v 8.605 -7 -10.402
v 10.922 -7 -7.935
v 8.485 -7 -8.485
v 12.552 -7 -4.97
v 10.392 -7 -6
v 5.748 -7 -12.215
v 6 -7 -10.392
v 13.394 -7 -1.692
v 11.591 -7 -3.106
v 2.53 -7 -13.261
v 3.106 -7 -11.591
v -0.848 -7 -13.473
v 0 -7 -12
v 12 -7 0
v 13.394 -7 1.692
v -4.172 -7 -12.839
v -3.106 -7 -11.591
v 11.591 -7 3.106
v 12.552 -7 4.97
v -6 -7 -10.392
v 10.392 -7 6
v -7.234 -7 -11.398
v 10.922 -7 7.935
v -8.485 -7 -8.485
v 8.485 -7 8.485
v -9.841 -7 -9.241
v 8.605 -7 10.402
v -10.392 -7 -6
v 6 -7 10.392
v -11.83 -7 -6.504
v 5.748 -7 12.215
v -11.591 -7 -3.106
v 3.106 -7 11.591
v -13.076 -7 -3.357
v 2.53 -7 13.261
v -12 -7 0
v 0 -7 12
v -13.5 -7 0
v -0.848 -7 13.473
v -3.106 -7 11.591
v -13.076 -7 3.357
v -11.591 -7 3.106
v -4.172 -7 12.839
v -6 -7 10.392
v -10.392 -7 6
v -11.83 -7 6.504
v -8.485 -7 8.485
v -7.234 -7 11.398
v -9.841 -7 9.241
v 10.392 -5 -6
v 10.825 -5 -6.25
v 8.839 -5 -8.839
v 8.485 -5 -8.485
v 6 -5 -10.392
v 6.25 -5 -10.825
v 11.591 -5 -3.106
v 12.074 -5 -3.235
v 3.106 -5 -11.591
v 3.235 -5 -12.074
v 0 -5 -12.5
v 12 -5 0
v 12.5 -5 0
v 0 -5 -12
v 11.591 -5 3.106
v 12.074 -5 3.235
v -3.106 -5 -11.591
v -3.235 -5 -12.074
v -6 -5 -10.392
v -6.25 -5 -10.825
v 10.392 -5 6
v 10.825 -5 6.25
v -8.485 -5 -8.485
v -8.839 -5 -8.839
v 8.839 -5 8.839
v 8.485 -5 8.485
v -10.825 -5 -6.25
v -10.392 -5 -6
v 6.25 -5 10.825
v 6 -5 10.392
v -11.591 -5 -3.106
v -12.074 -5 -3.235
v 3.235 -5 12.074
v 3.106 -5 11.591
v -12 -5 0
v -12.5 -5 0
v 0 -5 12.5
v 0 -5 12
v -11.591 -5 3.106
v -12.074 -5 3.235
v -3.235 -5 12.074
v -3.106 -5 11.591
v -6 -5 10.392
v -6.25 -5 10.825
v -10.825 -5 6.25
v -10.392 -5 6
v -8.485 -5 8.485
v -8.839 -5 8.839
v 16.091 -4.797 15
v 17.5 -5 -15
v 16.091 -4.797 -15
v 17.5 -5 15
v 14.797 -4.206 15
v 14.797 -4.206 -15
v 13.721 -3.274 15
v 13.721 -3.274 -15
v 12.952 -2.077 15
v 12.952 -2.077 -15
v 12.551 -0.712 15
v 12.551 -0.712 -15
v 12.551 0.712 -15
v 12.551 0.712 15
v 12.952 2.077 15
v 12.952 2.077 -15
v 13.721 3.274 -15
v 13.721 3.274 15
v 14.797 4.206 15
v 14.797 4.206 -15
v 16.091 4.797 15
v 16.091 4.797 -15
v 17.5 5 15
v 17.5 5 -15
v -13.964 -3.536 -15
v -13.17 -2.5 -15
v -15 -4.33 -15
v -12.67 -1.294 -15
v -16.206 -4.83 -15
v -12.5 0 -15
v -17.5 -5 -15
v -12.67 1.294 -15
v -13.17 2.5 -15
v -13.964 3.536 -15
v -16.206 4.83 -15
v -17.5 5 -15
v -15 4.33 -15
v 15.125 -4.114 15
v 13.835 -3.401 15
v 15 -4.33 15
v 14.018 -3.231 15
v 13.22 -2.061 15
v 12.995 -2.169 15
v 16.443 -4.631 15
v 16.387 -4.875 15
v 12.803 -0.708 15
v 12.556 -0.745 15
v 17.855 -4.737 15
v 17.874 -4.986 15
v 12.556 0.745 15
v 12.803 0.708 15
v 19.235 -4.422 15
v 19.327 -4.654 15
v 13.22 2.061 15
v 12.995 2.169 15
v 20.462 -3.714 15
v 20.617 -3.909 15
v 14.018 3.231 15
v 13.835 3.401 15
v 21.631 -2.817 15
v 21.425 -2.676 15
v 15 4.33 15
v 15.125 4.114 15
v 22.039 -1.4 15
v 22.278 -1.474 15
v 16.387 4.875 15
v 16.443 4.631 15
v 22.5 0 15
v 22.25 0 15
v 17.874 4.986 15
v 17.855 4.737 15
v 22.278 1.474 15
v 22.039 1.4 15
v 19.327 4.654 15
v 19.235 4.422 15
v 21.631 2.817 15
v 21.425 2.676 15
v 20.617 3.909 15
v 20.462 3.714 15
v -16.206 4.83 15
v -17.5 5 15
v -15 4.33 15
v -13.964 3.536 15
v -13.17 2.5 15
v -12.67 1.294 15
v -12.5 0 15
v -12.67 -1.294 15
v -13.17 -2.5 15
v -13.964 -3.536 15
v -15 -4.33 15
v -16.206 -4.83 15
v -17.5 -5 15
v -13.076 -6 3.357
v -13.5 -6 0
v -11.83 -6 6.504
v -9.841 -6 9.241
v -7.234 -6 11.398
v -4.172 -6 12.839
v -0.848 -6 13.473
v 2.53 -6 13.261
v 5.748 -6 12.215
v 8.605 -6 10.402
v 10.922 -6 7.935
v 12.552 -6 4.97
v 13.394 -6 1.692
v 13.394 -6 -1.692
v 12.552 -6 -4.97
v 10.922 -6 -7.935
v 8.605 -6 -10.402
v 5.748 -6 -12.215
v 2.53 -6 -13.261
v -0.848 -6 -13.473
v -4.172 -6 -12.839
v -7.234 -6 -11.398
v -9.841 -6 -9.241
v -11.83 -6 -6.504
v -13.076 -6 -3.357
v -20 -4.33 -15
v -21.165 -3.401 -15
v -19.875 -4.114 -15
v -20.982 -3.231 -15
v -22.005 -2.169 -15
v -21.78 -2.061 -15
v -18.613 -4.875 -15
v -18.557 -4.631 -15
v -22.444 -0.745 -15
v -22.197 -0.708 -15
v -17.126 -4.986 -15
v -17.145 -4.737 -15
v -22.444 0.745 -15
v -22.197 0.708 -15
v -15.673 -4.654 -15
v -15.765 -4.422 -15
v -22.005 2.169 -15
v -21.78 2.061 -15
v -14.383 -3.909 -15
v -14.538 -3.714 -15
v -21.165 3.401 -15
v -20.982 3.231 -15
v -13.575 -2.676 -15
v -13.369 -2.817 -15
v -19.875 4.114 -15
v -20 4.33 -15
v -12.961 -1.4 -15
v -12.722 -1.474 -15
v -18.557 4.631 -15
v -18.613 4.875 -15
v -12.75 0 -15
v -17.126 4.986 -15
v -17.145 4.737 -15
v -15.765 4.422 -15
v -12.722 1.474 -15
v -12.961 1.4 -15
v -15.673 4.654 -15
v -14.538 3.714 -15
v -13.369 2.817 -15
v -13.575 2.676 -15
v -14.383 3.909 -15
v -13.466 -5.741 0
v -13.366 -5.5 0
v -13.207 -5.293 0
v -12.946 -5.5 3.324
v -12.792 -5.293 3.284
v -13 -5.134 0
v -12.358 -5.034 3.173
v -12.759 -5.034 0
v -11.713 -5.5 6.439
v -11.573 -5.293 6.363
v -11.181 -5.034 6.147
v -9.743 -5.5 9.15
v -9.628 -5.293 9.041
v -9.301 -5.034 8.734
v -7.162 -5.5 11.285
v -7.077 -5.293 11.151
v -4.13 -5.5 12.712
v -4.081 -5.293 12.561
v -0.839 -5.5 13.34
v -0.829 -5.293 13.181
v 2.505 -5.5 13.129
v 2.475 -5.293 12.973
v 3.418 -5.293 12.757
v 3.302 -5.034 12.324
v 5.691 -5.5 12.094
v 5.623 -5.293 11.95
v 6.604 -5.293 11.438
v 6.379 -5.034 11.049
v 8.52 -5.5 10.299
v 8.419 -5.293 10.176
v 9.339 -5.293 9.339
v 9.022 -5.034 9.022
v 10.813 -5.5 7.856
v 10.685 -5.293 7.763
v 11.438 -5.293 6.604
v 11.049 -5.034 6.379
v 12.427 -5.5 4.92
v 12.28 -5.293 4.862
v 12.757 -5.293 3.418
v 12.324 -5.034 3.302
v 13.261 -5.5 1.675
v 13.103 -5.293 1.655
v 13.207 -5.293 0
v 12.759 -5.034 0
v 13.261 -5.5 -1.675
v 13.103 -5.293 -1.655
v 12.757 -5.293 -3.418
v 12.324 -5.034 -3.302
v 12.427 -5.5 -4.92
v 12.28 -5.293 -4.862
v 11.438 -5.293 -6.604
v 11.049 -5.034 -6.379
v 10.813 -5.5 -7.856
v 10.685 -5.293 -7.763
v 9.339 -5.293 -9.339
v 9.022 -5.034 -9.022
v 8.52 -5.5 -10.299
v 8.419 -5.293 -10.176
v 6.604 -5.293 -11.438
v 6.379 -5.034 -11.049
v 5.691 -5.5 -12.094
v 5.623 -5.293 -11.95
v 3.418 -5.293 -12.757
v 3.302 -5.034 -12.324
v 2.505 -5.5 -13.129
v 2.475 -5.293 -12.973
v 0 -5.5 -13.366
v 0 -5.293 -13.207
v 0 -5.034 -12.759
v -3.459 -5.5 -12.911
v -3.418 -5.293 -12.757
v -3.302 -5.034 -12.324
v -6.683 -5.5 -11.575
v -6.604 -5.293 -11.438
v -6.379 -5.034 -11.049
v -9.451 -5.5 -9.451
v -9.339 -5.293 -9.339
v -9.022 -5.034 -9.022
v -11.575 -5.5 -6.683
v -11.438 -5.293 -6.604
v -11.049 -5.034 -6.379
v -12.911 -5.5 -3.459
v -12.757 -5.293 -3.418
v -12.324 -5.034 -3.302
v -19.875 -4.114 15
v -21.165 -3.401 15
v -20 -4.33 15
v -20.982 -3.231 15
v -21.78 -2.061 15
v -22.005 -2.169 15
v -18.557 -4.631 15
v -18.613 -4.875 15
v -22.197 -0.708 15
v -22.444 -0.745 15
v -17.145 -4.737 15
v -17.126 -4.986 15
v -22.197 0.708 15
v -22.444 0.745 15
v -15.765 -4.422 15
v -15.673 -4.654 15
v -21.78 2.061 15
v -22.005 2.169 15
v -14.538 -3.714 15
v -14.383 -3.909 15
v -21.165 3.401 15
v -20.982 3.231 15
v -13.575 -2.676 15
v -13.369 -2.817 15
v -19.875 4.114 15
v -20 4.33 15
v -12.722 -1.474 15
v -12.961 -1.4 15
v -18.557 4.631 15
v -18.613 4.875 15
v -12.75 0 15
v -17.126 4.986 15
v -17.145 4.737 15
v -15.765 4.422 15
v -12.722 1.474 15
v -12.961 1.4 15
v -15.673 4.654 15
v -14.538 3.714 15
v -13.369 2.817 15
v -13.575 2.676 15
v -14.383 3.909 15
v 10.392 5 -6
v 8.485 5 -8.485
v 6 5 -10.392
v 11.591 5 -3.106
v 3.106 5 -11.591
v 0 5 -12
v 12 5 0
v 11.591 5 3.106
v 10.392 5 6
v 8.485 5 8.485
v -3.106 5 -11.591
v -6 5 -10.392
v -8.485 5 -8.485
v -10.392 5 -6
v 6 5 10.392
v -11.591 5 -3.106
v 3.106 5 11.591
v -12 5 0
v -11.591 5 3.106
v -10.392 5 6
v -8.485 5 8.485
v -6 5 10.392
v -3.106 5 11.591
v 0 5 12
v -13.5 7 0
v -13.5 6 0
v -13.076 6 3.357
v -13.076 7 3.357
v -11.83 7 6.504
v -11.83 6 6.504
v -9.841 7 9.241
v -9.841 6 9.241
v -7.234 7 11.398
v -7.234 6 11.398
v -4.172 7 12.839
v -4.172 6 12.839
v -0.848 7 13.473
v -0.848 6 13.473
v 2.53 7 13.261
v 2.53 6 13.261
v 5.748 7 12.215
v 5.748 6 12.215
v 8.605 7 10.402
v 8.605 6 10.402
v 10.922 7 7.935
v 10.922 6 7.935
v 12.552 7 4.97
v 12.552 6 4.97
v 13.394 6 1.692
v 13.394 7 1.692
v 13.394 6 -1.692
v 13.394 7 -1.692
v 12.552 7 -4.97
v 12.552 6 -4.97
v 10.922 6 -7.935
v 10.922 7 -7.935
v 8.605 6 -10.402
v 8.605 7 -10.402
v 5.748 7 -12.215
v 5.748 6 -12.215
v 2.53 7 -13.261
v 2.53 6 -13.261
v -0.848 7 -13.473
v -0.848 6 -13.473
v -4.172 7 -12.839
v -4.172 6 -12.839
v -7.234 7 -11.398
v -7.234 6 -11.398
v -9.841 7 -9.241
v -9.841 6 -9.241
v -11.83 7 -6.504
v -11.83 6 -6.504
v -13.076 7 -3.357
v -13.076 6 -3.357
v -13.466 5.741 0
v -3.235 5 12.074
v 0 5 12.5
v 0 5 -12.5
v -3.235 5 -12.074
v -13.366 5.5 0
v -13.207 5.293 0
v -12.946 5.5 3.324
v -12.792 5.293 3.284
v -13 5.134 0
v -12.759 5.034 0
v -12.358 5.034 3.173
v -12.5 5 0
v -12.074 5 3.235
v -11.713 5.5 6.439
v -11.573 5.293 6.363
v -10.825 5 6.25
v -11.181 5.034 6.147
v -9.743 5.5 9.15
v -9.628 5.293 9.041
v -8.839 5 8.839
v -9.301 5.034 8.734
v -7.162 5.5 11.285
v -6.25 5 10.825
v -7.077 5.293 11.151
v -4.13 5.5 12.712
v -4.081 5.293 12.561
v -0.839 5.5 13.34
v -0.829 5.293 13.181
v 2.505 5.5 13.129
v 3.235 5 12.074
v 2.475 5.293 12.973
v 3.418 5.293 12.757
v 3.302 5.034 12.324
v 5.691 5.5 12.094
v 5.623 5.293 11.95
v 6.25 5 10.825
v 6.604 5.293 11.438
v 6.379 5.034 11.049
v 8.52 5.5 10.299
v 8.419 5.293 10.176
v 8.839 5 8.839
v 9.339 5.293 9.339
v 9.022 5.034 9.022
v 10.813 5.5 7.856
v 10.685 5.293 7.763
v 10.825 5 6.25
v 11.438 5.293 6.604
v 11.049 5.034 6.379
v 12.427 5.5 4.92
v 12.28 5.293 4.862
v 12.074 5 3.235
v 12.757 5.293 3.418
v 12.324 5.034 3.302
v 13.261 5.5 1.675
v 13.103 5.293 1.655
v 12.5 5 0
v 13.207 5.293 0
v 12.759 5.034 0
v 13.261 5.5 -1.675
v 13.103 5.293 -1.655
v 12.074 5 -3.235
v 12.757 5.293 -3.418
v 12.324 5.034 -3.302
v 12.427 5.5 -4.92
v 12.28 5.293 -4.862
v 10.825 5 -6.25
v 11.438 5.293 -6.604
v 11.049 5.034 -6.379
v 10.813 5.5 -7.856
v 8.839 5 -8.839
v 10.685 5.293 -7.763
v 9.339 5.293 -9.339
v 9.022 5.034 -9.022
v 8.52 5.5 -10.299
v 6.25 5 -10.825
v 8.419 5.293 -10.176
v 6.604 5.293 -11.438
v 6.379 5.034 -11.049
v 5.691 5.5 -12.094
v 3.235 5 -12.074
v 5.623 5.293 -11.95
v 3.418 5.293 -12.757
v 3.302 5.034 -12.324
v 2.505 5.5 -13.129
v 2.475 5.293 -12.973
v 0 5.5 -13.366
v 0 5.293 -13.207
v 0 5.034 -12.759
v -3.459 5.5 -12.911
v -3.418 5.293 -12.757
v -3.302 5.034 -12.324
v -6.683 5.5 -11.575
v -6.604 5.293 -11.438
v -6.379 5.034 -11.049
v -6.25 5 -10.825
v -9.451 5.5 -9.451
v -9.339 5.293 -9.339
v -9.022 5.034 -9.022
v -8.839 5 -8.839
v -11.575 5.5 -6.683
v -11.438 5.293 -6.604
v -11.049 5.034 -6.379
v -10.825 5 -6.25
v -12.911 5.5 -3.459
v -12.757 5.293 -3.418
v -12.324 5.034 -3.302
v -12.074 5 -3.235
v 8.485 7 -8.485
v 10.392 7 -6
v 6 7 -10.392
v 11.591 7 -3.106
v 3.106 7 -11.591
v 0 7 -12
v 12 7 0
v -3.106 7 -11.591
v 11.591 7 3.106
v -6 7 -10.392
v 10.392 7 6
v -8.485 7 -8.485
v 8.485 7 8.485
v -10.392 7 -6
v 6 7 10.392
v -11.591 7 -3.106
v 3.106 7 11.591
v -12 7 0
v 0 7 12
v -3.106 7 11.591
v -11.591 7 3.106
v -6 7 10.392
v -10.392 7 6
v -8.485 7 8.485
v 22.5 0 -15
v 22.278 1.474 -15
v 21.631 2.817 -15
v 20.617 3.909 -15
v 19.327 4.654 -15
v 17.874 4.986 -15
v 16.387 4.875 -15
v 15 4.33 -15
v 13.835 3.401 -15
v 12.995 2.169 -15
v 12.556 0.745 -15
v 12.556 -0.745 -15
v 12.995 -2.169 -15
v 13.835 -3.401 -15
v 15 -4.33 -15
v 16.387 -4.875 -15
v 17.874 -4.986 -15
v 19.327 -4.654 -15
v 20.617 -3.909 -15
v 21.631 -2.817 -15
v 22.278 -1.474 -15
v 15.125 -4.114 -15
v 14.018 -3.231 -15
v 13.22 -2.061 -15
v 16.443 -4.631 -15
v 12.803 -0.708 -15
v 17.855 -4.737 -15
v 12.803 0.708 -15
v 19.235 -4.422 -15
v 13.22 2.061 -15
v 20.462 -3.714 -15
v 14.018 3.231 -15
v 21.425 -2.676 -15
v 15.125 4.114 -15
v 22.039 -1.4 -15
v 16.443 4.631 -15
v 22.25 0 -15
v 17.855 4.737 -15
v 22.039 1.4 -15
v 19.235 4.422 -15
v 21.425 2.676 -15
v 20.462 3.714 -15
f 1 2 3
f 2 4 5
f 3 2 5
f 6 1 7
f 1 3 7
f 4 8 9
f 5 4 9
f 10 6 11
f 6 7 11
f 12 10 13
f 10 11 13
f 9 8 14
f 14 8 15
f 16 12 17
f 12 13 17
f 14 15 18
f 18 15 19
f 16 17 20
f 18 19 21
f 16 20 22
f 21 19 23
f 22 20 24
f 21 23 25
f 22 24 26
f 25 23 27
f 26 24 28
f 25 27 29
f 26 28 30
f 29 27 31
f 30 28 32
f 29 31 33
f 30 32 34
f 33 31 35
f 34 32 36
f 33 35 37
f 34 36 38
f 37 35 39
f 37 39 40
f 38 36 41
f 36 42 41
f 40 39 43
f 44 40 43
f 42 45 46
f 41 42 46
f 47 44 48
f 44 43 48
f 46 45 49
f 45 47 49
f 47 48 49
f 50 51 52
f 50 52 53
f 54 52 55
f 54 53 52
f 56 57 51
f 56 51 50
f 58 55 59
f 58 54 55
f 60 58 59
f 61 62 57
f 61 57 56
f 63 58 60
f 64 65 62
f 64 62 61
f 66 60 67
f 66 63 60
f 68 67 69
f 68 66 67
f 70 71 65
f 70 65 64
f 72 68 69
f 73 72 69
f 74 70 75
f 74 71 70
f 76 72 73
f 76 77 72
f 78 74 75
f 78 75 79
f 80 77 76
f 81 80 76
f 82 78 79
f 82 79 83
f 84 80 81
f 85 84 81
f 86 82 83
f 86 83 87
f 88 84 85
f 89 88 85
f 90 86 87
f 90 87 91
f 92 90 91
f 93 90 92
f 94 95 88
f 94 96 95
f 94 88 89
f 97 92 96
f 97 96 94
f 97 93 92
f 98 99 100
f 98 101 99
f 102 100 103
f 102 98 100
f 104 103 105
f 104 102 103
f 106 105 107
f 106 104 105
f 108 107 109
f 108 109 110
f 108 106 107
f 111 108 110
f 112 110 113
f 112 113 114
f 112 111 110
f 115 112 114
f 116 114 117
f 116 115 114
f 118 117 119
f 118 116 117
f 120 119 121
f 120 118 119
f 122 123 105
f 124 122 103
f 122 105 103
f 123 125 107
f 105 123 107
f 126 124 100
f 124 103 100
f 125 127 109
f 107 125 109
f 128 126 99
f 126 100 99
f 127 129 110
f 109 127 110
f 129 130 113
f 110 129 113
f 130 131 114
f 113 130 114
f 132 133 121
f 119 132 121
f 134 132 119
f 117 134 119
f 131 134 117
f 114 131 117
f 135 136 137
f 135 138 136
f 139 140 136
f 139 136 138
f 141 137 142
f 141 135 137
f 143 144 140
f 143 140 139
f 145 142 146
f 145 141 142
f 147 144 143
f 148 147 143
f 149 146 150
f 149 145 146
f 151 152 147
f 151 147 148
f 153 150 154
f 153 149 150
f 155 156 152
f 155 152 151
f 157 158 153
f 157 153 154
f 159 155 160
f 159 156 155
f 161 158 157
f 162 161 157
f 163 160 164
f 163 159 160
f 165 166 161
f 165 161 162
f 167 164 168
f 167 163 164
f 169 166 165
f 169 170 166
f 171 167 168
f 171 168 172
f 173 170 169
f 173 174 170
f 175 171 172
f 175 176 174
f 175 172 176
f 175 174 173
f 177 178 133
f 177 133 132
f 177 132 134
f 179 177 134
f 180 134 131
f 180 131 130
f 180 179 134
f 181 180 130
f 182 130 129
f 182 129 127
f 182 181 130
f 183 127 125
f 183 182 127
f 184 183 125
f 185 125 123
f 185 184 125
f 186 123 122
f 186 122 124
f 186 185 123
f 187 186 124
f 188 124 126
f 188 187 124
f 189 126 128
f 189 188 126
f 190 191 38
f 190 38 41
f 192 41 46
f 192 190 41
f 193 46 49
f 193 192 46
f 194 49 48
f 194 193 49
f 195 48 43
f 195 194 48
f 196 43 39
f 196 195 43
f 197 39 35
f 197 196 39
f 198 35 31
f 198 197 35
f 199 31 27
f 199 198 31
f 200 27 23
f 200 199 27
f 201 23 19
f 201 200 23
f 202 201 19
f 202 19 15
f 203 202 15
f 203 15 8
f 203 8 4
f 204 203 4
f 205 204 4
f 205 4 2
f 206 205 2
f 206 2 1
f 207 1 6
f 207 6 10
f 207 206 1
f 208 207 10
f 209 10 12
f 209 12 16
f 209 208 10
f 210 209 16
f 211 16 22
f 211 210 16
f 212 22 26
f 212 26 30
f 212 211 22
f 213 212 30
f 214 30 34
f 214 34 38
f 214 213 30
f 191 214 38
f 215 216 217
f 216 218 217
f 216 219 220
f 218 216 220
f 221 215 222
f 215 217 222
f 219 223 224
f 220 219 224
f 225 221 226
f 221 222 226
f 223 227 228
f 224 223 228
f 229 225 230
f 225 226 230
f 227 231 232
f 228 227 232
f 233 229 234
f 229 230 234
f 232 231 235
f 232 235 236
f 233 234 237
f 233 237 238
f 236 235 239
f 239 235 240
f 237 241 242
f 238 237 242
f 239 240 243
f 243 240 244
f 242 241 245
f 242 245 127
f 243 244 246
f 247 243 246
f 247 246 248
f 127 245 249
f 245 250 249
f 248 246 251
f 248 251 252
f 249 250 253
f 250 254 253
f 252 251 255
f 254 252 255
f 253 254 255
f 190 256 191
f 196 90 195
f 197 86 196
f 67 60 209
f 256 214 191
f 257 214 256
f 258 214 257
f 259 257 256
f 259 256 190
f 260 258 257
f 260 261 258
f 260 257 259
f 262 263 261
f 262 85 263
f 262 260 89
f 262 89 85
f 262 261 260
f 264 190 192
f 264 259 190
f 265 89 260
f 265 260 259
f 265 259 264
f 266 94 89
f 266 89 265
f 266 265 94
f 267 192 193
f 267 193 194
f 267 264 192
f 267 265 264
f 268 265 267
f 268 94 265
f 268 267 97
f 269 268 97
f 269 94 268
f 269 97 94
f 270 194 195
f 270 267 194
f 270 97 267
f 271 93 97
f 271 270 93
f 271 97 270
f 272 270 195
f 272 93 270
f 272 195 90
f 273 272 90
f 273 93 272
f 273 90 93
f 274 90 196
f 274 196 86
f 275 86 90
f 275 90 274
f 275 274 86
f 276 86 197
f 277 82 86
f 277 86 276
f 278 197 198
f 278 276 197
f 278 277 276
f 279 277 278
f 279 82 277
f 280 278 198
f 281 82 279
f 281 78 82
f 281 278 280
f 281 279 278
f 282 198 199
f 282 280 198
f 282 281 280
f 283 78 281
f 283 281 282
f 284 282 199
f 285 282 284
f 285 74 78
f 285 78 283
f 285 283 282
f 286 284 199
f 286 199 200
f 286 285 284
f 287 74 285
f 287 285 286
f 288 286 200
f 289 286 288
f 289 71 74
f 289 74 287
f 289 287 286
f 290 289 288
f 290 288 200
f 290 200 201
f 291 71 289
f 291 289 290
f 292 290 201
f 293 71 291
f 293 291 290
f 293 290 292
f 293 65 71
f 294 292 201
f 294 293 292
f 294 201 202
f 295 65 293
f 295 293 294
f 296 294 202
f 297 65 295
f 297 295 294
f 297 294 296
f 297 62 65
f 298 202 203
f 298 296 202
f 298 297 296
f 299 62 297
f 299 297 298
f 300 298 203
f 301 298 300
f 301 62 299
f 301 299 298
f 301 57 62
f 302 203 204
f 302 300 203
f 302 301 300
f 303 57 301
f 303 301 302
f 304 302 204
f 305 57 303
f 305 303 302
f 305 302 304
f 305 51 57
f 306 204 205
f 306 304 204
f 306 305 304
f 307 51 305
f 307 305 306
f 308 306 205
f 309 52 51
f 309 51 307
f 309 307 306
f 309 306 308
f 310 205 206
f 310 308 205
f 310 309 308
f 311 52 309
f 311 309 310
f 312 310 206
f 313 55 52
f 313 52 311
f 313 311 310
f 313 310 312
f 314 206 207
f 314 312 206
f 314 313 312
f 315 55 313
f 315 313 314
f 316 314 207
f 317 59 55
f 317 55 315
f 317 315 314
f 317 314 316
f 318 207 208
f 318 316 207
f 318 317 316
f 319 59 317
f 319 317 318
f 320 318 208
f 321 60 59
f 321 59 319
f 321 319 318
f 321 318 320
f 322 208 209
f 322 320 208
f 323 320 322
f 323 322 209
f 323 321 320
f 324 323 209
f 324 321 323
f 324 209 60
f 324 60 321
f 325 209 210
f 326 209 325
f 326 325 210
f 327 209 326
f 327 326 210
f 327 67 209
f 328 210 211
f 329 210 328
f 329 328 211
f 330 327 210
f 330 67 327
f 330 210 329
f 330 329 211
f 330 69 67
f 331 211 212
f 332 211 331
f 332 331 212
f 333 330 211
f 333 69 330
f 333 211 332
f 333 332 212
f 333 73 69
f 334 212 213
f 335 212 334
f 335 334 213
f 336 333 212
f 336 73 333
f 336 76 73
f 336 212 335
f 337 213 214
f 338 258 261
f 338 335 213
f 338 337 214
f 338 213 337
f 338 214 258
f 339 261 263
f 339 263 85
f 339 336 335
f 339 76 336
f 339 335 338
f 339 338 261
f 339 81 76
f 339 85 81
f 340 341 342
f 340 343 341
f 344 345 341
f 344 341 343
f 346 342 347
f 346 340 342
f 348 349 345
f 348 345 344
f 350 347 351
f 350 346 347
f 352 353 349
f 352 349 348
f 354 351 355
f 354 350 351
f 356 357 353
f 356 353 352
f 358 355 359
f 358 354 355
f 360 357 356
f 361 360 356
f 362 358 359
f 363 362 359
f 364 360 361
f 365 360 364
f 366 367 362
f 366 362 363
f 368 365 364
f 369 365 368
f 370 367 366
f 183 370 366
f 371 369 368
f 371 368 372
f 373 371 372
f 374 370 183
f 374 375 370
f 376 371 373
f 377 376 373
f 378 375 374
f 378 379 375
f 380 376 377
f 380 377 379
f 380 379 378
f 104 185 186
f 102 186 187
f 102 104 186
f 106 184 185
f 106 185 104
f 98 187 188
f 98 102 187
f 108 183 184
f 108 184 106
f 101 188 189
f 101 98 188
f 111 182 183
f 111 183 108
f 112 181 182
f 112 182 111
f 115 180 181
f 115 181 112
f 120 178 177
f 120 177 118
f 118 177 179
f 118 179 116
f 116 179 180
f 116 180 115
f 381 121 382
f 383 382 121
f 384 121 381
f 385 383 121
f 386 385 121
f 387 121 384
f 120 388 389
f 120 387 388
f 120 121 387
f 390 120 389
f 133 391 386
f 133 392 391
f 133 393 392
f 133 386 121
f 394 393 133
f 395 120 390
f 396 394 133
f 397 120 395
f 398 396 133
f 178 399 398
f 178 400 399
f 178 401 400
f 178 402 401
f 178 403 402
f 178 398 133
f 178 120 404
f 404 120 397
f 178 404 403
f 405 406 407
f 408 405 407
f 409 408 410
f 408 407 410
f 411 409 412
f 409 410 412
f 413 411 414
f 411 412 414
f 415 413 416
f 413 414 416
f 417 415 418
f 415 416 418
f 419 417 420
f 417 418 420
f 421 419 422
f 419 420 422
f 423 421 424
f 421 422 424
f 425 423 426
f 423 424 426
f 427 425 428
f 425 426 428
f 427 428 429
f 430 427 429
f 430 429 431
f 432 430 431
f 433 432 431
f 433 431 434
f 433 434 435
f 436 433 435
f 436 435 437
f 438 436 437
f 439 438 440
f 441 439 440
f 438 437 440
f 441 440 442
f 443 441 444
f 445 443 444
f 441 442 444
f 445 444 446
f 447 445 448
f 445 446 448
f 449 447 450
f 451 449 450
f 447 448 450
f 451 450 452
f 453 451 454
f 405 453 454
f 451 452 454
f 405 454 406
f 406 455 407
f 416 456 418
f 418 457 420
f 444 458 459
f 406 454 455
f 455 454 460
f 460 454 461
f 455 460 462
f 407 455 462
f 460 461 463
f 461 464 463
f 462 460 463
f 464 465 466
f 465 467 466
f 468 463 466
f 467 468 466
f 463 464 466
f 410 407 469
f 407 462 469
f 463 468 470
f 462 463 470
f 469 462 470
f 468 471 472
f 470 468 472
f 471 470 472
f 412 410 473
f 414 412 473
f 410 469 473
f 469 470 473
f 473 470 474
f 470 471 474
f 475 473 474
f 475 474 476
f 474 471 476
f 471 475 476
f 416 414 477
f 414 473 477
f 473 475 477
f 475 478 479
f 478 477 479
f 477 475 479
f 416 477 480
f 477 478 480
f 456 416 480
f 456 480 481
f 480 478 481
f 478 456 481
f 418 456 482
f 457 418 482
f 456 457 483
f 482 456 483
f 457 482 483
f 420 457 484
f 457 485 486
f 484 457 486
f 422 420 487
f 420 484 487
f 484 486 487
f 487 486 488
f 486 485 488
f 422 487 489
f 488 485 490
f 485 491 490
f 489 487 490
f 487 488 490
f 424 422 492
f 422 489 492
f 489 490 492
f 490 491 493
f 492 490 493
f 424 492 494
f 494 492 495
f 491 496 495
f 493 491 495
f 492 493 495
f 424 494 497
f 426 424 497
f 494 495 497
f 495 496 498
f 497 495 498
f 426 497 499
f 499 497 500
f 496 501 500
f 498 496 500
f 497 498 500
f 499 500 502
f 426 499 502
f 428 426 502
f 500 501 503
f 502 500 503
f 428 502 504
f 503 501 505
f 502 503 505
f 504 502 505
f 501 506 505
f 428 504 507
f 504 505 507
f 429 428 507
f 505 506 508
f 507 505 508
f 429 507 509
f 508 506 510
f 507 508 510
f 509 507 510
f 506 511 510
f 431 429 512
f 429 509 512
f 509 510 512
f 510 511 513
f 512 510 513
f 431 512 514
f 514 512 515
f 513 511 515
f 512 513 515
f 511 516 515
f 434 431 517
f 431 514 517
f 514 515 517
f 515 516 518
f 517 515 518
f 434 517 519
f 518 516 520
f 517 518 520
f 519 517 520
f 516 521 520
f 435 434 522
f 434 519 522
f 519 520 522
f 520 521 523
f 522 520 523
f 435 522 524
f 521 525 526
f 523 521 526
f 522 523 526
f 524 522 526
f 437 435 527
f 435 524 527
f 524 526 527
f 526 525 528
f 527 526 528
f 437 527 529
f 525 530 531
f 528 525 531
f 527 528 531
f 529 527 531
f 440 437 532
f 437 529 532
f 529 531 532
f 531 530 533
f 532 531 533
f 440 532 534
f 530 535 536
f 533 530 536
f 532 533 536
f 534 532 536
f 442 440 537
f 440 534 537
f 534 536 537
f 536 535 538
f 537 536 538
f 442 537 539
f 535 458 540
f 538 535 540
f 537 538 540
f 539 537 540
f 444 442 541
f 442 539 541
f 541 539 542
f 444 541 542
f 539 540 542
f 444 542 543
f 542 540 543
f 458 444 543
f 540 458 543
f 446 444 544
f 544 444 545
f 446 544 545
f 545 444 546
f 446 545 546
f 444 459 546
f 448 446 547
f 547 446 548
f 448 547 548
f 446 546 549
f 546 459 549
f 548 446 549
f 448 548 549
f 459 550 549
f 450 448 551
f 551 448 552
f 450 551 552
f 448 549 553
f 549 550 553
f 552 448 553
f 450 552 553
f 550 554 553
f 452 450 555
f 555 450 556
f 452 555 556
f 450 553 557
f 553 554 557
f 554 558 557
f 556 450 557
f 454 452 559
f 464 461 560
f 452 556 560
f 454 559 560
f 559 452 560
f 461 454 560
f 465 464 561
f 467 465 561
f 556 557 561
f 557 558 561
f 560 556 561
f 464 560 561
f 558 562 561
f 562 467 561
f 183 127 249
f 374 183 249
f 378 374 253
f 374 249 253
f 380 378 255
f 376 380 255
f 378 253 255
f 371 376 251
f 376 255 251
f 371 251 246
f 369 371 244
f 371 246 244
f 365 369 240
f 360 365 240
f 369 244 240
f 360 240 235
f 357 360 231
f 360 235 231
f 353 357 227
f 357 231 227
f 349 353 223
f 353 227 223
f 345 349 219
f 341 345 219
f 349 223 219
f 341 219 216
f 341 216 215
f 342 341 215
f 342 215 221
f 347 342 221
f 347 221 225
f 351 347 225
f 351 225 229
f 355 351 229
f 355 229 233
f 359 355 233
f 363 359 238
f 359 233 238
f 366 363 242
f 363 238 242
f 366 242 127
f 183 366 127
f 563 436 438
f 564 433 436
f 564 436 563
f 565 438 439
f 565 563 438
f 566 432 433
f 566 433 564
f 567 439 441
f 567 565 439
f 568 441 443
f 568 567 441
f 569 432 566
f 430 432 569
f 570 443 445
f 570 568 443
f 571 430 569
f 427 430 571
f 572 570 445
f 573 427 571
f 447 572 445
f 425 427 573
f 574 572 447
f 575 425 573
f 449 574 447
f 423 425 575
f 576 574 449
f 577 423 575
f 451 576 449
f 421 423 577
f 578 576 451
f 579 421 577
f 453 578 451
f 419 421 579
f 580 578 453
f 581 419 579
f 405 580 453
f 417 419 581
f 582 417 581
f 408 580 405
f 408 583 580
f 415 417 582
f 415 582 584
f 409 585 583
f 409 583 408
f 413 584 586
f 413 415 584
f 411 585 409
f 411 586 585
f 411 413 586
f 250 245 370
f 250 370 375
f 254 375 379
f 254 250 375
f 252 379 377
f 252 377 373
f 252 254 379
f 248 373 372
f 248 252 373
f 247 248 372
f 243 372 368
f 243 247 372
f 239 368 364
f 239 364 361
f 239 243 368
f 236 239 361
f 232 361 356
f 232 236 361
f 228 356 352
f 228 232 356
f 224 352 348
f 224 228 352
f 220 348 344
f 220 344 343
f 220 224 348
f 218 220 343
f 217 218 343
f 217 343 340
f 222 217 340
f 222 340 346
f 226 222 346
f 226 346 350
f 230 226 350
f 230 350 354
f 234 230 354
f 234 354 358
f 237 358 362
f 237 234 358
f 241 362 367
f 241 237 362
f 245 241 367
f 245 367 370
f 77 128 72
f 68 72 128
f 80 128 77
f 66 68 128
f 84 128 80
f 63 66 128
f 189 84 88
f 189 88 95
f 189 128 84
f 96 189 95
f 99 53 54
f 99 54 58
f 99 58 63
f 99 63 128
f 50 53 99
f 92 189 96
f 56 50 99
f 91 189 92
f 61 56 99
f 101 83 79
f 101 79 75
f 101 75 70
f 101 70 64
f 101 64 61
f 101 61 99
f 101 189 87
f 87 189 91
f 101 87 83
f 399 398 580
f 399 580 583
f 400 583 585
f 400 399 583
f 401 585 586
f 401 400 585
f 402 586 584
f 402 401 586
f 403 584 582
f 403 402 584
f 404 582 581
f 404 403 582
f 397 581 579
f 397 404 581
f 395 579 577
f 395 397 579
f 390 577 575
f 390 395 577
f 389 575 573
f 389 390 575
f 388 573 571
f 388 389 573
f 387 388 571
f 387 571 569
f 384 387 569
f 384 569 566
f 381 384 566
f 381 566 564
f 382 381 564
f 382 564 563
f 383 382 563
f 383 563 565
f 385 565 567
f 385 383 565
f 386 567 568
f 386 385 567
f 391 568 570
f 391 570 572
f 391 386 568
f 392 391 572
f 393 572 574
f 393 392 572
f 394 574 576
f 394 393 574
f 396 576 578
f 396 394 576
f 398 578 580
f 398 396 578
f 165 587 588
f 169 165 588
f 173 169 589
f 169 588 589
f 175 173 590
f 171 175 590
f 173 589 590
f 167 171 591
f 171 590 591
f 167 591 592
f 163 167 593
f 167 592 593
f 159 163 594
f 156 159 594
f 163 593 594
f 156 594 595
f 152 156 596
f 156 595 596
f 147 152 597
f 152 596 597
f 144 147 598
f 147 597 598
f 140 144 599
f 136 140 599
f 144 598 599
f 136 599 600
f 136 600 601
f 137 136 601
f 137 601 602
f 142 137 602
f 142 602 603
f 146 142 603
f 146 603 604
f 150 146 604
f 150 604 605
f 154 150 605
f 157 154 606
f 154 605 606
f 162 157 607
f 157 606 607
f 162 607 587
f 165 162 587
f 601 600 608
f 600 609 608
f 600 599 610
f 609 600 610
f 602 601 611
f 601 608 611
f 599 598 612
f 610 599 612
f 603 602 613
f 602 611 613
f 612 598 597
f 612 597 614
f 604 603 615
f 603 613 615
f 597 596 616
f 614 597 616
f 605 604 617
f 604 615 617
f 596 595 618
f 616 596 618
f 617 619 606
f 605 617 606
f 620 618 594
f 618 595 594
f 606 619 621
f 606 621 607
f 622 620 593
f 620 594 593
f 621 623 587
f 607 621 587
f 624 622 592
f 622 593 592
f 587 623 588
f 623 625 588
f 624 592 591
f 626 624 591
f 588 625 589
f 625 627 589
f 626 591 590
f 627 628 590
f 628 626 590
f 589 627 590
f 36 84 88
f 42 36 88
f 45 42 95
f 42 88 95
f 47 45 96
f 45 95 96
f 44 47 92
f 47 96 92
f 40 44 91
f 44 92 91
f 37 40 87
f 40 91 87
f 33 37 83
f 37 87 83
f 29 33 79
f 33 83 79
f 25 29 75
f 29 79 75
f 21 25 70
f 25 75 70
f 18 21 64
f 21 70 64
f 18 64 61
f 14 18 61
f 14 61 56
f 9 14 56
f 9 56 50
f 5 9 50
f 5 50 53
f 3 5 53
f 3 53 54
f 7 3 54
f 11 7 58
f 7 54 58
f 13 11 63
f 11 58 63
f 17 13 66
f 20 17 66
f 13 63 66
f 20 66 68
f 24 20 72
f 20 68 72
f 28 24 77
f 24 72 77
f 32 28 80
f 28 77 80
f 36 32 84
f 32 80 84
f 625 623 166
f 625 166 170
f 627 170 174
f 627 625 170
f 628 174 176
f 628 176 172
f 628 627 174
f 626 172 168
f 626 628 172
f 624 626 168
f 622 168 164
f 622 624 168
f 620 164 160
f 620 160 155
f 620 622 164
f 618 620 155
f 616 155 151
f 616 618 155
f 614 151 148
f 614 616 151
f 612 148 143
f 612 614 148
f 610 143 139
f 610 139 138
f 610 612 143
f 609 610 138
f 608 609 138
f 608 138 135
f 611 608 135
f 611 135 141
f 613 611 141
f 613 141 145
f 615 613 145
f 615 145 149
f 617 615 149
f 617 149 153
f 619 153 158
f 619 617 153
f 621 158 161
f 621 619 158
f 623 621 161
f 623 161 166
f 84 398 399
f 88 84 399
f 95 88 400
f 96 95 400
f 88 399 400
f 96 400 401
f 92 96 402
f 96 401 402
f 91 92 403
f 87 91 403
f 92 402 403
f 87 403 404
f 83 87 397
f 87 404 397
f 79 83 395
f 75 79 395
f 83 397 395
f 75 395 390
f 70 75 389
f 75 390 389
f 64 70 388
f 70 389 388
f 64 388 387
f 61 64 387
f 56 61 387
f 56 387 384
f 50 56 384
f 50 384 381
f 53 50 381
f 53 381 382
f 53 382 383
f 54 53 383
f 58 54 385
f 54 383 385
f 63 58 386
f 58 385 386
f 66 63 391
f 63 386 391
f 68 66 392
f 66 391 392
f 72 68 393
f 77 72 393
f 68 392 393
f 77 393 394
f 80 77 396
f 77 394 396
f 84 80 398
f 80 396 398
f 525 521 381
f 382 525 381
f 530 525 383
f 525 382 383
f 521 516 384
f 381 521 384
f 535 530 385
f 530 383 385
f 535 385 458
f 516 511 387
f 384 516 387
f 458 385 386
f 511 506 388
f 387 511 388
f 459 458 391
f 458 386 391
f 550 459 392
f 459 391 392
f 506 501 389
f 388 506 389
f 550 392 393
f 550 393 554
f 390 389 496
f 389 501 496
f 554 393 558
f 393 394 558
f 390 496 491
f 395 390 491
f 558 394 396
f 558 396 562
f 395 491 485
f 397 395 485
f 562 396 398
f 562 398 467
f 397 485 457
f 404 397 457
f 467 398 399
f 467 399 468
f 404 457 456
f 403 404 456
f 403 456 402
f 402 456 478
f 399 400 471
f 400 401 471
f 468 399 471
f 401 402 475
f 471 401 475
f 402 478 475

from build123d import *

# Parameters (mm, degrees)
SKETCH1_R                  = 5
SKETCH1_R_2                = 4.75
STRUCTURAL_MEMBER1_DEPTH   = 30
SKETCH1_ON_SEGMENT_2_R     = 5
SKETCH1_ON_SEGMENT_2_R_2   = 4.75
STRUCTURAL_MEMBER1_2_DEPTH = 30
BOSS_EXTRUDE2_DEPTH        = 15
SKETCH21_R                 = 12
CUT_EXTRUDE6_DEPTH         = 10
SKETCH22_R                 = 13.5
SKETCH22_R_2               = 12
BOSS_EXTRUDE3_DEPTH        = 2
FILLET2_R                  = 1


with BuildPart() as part:
    # Sketch1 → Structural Member1 (new body)
    with BuildSketch(Plane(origin=(-17.5, 0, -15), x_dir=(1, 0, 0), z_dir=(0, 0, 1))):
        Circle(SKETCH1_R)
        Circle(SKETCH1_R_2, mode=Mode.SUBTRACT)
    extrude(amount=STRUCTURAL_MEMBER1_DEPTH)


with BuildPart() as body_2:
    # Sketch1 on segment 2 (carried to segment 2) → Structural Member1 2 (new body)
    with BuildSketch(Plane(origin=(17.5, 0, -15), x_dir=(1, 0, 0), z_dir=(0, 0, 1))):
        Circle(SKETCH1_ON_SEGMENT_2_R)
        Circle(SKETCH1_ON_SEGMENT_2_R_2, mode=Mode.SUBTRACT)
    extrude(amount=STRUCTURAL_MEMBER1_2_DEPTH)


with BuildPart() as body_3:
    # Sketch4 → Boss-Extrude2 (new, symmetric)
    with BuildSketch(Plane.XY):
        with BuildLine():
            Line((17.5, 5), (-17.5, 5))
            ThreePointArc((-17.5, 5), (-13.964466094, 3.535533906), (-12.5, 0))
            ThreePointArc((-12.5, 0), (-13.964466094, -3.535533906), (-17.5, -5))
            Line((-17.5, -5), (17.5, -5))
            ThreePointArc((17.5, -5), (12.5, 0), (17.5, 5))
        make_face()
    extrude(amount=BOSS_EXTRUDE2_DEPTH, both=True)

    # Sketch21 → Cut-Extrude6 (cut, symmetric)
    with BuildSketch(Plane(origin=(0, 5, 0), x_dir=(1, 0, 0), z_dir=(0, 1, 0))):
        with Locations(Location((0, 0, 0), (0, 0, 180))):
            Circle(SKETCH21_R)
    extrude(amount=CUT_EXTRUDE6_DEPTH, both=True, mode=Mode.SUBTRACT)


with BuildPart() as body_4:
    # Sketch22 → Boss-Extrude3 (new body)
    with BuildSketch(Plane(origin=(0, 5, 0), x_dir=(1, 0, 0), z_dir=(0, 1, 0))):
        with Locations(Location((0, 0, 0), (0, 0, 180))):
            Circle(SKETCH22_R)
        with Locations(Location((0, 0, 0), (0, 0, 180))):
            Circle(SKETCH22_R_2, mode=Mode.SUBTRACT)
    extrude(amount=BOSS_EXTRUDE3_DEPTH)

    # Fillet2
    fillet2_edges = [body_4.edges().sort_by_distance(p)[0] for p in [
        (13.5, 5, 0),
    ]]
    fillet(fillet2_edges, radius=FILLET2_R)


with BuildPart() as body_5:
    # Mirror1: mirrored copy
    add(body_4.part.mirror(Plane.ZX))


solid = Compound([part.part, body_2.part, body_3.part, body_4.part, body_5.part])
